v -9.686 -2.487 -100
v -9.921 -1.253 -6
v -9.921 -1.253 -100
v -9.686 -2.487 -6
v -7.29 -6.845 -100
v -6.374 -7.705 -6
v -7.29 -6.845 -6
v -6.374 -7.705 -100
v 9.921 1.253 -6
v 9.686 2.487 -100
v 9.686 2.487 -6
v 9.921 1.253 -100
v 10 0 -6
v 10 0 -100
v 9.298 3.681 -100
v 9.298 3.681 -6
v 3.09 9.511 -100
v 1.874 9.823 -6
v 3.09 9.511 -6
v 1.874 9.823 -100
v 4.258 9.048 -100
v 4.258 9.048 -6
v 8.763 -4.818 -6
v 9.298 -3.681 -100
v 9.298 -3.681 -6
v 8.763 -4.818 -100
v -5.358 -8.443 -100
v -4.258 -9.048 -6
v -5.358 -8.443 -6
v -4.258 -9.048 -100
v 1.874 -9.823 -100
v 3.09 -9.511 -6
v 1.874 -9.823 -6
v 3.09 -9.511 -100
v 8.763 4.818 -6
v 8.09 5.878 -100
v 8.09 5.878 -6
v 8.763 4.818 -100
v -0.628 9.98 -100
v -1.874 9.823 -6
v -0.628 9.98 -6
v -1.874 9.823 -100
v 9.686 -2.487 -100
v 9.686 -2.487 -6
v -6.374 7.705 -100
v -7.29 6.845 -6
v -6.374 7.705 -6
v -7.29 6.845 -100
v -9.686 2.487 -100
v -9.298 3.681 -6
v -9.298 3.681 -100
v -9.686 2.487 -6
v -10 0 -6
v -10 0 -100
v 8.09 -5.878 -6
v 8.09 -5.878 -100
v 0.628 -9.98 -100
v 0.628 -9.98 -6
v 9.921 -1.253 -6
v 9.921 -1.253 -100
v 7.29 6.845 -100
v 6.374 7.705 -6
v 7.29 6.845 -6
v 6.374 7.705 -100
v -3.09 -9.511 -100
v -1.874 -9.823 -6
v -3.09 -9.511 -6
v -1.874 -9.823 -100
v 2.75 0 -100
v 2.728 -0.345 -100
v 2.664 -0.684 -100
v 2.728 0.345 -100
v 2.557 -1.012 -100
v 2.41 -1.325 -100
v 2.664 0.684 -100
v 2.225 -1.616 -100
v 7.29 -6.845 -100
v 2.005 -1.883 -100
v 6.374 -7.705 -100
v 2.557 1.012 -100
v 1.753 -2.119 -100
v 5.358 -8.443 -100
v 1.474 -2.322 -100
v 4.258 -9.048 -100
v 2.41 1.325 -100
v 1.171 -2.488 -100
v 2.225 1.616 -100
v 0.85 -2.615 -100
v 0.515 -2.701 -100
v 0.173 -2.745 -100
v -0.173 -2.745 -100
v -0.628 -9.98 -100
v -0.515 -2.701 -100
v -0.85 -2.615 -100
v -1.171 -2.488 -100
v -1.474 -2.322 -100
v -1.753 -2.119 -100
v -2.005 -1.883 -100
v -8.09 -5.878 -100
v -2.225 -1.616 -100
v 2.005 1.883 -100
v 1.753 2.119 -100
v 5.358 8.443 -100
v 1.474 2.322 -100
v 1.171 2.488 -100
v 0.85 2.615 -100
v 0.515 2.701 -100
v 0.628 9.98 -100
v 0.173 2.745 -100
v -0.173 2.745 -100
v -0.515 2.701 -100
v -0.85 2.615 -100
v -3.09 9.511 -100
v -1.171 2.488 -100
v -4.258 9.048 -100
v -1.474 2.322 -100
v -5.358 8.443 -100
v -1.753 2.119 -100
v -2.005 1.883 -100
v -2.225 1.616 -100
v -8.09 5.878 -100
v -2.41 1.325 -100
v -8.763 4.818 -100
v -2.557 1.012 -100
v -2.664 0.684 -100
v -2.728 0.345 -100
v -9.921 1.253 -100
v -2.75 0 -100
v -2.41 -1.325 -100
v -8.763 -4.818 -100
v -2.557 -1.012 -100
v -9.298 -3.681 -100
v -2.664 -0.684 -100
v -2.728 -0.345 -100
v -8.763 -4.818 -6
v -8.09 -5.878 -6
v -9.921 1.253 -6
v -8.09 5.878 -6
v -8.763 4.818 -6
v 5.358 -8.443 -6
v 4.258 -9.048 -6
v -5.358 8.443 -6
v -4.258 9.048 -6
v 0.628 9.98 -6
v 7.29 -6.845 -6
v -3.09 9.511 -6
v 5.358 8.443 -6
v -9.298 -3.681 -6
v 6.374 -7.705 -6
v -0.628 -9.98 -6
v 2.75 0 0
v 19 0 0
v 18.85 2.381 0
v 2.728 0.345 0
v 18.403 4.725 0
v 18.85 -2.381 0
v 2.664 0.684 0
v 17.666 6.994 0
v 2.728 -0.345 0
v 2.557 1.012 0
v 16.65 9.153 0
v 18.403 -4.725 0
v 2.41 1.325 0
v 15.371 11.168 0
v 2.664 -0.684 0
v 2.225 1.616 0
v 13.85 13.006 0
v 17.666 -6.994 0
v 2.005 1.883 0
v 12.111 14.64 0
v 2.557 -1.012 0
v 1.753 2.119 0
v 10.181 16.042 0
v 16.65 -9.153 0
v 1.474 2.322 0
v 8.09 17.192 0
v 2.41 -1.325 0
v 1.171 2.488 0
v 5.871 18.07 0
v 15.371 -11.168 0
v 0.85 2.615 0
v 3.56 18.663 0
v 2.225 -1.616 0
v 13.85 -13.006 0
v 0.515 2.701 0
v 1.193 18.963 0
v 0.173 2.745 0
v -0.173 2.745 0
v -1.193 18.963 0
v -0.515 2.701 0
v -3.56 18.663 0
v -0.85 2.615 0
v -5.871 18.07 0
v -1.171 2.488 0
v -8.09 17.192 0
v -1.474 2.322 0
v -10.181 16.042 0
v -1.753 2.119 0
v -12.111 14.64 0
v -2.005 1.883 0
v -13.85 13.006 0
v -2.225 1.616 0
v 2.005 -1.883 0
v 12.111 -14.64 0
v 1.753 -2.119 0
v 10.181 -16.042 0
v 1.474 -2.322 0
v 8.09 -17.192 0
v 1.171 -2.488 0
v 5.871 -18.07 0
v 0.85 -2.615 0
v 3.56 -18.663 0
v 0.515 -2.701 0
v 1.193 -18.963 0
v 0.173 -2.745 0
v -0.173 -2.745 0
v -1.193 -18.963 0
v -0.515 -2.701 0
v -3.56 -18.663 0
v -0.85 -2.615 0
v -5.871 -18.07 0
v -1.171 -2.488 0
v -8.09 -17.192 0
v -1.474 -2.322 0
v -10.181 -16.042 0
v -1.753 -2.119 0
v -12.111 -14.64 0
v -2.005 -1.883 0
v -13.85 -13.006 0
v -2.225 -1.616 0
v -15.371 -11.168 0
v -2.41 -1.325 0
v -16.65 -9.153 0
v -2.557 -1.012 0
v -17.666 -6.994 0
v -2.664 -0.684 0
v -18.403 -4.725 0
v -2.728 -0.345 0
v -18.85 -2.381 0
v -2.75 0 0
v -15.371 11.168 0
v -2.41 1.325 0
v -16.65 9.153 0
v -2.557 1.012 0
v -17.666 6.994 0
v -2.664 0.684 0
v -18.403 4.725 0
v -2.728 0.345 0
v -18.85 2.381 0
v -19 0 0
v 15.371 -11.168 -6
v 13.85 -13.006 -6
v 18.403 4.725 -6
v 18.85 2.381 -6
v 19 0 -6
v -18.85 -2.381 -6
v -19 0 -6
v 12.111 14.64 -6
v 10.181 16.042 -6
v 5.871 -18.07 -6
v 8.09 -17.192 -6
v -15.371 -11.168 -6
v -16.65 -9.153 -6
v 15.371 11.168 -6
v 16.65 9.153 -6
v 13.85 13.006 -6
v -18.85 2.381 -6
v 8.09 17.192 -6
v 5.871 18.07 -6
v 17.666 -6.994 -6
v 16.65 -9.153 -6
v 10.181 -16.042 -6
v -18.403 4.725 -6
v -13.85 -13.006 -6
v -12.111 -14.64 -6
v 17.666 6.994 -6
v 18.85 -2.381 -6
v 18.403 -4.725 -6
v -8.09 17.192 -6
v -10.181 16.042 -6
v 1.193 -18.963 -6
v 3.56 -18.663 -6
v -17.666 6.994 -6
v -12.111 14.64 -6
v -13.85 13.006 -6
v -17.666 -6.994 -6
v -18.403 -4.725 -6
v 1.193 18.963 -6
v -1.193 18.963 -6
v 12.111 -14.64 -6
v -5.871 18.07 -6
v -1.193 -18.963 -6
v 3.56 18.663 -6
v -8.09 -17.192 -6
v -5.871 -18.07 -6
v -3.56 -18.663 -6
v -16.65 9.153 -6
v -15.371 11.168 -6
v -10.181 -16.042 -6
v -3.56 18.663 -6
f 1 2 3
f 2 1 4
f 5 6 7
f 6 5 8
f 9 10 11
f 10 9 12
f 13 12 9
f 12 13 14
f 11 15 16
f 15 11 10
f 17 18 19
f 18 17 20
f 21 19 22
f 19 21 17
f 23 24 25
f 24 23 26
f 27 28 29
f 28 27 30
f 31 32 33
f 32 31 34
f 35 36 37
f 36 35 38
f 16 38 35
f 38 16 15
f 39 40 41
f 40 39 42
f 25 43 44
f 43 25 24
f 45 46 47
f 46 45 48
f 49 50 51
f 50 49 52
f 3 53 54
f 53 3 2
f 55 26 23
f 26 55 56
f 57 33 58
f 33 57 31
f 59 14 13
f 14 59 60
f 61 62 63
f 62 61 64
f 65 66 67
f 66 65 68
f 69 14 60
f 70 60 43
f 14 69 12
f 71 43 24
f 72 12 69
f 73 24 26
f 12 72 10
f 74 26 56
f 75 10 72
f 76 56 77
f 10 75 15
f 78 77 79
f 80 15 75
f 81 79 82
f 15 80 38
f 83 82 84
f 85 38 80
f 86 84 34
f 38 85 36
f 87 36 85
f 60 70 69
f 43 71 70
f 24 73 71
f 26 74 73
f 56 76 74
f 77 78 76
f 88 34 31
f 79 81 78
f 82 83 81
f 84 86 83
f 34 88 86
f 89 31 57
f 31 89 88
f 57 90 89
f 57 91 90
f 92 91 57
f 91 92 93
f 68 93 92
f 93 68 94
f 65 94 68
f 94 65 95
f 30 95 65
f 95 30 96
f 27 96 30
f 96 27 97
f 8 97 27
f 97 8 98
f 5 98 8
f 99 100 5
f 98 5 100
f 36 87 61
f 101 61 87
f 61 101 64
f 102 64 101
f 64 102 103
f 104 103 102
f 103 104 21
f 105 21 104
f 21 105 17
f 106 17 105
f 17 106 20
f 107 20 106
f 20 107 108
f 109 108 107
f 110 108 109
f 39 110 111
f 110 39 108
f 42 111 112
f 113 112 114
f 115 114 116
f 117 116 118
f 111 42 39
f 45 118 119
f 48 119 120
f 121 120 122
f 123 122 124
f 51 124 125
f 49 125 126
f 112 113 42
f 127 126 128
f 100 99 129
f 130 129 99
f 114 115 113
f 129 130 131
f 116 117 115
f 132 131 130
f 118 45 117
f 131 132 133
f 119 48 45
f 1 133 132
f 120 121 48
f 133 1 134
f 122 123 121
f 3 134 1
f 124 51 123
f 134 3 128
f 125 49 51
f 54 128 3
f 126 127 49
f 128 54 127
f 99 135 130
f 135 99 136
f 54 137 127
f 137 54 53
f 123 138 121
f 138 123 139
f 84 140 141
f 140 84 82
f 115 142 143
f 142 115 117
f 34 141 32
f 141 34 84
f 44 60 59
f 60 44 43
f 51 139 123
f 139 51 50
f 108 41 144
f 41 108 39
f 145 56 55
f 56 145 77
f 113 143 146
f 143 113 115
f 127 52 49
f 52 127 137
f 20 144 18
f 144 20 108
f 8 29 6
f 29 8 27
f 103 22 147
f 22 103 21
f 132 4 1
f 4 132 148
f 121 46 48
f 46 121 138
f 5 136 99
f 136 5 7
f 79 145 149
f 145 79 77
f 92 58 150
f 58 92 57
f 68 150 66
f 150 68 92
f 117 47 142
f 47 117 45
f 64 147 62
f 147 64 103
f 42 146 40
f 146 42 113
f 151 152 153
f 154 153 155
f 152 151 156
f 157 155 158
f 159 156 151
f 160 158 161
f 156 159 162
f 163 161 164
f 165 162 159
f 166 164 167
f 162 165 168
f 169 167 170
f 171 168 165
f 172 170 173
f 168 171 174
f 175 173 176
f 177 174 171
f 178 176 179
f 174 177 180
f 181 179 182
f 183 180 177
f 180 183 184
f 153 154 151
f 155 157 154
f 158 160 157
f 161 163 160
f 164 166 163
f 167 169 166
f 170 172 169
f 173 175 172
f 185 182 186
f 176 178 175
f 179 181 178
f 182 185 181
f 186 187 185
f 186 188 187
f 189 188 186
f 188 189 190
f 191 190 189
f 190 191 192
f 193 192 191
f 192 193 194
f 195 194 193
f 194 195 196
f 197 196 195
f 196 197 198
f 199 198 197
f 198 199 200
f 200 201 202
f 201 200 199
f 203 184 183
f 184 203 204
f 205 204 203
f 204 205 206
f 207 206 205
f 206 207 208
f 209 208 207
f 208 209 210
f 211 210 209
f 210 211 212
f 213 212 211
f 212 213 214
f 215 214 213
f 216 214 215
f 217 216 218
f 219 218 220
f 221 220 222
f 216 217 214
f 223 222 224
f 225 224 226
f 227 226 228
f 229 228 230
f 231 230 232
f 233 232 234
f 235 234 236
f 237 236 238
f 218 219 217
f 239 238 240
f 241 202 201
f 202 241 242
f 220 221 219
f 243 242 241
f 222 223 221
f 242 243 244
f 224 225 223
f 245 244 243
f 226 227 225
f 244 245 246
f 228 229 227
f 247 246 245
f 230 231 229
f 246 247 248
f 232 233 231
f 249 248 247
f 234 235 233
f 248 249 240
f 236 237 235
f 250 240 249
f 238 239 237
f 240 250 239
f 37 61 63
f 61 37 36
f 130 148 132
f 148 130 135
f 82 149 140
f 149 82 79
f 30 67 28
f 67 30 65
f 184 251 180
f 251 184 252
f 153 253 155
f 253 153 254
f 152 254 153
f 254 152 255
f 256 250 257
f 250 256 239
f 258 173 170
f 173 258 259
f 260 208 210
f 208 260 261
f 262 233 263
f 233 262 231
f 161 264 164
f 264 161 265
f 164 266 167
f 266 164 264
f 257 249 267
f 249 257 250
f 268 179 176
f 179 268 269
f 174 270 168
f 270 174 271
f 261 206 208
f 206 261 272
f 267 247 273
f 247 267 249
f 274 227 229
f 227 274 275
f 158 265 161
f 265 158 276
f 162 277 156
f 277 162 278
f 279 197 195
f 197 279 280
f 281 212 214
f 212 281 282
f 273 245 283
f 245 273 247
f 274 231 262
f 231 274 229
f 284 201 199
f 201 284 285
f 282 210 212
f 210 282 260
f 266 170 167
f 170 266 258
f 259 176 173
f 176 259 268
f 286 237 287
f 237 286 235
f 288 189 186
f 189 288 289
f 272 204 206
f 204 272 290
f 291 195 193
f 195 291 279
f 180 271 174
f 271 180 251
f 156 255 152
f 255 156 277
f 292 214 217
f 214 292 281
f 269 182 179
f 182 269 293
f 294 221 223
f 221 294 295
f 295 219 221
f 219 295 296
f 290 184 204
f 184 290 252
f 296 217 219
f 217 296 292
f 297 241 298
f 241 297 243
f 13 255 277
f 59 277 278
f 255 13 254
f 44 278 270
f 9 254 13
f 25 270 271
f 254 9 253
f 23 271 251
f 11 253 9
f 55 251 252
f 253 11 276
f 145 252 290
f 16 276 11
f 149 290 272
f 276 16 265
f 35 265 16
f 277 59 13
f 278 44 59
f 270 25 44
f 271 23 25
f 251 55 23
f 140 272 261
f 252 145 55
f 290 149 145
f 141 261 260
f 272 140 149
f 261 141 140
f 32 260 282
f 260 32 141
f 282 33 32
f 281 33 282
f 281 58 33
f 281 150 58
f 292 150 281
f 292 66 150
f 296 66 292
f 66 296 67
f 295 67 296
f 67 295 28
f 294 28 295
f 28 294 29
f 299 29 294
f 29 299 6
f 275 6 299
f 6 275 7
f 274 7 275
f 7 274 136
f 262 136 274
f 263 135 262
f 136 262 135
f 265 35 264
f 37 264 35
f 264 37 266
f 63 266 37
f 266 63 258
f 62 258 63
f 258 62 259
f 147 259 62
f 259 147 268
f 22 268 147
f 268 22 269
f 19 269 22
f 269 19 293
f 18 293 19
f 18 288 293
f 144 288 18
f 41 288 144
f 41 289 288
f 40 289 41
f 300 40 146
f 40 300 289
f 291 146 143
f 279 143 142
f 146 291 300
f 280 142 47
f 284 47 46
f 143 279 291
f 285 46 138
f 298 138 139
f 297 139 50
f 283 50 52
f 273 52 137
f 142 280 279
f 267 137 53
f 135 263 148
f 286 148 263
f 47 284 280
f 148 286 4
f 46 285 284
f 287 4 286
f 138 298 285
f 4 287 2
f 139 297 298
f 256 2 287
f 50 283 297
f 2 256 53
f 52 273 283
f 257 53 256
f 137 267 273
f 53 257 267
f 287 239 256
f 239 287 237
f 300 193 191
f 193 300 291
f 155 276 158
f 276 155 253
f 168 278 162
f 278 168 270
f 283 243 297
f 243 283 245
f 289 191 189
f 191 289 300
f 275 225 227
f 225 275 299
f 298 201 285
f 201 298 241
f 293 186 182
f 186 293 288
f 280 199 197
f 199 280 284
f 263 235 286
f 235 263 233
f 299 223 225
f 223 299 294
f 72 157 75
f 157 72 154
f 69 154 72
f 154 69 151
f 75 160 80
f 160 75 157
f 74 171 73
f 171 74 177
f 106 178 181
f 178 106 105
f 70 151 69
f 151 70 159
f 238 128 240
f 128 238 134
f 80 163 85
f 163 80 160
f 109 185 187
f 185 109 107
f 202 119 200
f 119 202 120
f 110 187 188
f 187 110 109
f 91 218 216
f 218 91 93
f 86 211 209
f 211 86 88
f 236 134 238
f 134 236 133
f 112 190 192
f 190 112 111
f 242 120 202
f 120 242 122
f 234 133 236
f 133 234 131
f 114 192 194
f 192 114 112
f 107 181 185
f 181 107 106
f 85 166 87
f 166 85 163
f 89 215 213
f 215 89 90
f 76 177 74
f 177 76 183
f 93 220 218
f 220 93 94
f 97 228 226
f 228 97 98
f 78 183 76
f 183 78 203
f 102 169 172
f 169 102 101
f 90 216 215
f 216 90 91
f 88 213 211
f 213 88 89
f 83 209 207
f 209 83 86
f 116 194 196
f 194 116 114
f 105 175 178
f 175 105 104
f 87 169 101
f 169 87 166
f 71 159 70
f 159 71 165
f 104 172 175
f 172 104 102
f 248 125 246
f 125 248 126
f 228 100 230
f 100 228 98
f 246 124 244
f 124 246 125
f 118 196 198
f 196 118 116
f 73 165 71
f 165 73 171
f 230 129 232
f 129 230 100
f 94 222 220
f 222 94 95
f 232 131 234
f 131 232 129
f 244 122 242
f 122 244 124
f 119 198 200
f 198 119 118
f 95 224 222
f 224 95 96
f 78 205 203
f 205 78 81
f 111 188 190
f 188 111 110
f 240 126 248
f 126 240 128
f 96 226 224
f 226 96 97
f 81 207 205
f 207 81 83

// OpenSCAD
$fn = 50;


difference() {
	union() {
		translate(v = [0, 0, -100.0000000000]) {
			cylinder(h = 100, r = 10.0000000000);
		}
		translate(v = [0, 0, -6.0000000000]) {
			cylinder(h = 6, r = 19.0000000000);
		}
	}
	union() {
		#translate(v = [0, 0, -100]) {
			cylinder(h = 100, r = 2.7500000000);
		}
	}
}
